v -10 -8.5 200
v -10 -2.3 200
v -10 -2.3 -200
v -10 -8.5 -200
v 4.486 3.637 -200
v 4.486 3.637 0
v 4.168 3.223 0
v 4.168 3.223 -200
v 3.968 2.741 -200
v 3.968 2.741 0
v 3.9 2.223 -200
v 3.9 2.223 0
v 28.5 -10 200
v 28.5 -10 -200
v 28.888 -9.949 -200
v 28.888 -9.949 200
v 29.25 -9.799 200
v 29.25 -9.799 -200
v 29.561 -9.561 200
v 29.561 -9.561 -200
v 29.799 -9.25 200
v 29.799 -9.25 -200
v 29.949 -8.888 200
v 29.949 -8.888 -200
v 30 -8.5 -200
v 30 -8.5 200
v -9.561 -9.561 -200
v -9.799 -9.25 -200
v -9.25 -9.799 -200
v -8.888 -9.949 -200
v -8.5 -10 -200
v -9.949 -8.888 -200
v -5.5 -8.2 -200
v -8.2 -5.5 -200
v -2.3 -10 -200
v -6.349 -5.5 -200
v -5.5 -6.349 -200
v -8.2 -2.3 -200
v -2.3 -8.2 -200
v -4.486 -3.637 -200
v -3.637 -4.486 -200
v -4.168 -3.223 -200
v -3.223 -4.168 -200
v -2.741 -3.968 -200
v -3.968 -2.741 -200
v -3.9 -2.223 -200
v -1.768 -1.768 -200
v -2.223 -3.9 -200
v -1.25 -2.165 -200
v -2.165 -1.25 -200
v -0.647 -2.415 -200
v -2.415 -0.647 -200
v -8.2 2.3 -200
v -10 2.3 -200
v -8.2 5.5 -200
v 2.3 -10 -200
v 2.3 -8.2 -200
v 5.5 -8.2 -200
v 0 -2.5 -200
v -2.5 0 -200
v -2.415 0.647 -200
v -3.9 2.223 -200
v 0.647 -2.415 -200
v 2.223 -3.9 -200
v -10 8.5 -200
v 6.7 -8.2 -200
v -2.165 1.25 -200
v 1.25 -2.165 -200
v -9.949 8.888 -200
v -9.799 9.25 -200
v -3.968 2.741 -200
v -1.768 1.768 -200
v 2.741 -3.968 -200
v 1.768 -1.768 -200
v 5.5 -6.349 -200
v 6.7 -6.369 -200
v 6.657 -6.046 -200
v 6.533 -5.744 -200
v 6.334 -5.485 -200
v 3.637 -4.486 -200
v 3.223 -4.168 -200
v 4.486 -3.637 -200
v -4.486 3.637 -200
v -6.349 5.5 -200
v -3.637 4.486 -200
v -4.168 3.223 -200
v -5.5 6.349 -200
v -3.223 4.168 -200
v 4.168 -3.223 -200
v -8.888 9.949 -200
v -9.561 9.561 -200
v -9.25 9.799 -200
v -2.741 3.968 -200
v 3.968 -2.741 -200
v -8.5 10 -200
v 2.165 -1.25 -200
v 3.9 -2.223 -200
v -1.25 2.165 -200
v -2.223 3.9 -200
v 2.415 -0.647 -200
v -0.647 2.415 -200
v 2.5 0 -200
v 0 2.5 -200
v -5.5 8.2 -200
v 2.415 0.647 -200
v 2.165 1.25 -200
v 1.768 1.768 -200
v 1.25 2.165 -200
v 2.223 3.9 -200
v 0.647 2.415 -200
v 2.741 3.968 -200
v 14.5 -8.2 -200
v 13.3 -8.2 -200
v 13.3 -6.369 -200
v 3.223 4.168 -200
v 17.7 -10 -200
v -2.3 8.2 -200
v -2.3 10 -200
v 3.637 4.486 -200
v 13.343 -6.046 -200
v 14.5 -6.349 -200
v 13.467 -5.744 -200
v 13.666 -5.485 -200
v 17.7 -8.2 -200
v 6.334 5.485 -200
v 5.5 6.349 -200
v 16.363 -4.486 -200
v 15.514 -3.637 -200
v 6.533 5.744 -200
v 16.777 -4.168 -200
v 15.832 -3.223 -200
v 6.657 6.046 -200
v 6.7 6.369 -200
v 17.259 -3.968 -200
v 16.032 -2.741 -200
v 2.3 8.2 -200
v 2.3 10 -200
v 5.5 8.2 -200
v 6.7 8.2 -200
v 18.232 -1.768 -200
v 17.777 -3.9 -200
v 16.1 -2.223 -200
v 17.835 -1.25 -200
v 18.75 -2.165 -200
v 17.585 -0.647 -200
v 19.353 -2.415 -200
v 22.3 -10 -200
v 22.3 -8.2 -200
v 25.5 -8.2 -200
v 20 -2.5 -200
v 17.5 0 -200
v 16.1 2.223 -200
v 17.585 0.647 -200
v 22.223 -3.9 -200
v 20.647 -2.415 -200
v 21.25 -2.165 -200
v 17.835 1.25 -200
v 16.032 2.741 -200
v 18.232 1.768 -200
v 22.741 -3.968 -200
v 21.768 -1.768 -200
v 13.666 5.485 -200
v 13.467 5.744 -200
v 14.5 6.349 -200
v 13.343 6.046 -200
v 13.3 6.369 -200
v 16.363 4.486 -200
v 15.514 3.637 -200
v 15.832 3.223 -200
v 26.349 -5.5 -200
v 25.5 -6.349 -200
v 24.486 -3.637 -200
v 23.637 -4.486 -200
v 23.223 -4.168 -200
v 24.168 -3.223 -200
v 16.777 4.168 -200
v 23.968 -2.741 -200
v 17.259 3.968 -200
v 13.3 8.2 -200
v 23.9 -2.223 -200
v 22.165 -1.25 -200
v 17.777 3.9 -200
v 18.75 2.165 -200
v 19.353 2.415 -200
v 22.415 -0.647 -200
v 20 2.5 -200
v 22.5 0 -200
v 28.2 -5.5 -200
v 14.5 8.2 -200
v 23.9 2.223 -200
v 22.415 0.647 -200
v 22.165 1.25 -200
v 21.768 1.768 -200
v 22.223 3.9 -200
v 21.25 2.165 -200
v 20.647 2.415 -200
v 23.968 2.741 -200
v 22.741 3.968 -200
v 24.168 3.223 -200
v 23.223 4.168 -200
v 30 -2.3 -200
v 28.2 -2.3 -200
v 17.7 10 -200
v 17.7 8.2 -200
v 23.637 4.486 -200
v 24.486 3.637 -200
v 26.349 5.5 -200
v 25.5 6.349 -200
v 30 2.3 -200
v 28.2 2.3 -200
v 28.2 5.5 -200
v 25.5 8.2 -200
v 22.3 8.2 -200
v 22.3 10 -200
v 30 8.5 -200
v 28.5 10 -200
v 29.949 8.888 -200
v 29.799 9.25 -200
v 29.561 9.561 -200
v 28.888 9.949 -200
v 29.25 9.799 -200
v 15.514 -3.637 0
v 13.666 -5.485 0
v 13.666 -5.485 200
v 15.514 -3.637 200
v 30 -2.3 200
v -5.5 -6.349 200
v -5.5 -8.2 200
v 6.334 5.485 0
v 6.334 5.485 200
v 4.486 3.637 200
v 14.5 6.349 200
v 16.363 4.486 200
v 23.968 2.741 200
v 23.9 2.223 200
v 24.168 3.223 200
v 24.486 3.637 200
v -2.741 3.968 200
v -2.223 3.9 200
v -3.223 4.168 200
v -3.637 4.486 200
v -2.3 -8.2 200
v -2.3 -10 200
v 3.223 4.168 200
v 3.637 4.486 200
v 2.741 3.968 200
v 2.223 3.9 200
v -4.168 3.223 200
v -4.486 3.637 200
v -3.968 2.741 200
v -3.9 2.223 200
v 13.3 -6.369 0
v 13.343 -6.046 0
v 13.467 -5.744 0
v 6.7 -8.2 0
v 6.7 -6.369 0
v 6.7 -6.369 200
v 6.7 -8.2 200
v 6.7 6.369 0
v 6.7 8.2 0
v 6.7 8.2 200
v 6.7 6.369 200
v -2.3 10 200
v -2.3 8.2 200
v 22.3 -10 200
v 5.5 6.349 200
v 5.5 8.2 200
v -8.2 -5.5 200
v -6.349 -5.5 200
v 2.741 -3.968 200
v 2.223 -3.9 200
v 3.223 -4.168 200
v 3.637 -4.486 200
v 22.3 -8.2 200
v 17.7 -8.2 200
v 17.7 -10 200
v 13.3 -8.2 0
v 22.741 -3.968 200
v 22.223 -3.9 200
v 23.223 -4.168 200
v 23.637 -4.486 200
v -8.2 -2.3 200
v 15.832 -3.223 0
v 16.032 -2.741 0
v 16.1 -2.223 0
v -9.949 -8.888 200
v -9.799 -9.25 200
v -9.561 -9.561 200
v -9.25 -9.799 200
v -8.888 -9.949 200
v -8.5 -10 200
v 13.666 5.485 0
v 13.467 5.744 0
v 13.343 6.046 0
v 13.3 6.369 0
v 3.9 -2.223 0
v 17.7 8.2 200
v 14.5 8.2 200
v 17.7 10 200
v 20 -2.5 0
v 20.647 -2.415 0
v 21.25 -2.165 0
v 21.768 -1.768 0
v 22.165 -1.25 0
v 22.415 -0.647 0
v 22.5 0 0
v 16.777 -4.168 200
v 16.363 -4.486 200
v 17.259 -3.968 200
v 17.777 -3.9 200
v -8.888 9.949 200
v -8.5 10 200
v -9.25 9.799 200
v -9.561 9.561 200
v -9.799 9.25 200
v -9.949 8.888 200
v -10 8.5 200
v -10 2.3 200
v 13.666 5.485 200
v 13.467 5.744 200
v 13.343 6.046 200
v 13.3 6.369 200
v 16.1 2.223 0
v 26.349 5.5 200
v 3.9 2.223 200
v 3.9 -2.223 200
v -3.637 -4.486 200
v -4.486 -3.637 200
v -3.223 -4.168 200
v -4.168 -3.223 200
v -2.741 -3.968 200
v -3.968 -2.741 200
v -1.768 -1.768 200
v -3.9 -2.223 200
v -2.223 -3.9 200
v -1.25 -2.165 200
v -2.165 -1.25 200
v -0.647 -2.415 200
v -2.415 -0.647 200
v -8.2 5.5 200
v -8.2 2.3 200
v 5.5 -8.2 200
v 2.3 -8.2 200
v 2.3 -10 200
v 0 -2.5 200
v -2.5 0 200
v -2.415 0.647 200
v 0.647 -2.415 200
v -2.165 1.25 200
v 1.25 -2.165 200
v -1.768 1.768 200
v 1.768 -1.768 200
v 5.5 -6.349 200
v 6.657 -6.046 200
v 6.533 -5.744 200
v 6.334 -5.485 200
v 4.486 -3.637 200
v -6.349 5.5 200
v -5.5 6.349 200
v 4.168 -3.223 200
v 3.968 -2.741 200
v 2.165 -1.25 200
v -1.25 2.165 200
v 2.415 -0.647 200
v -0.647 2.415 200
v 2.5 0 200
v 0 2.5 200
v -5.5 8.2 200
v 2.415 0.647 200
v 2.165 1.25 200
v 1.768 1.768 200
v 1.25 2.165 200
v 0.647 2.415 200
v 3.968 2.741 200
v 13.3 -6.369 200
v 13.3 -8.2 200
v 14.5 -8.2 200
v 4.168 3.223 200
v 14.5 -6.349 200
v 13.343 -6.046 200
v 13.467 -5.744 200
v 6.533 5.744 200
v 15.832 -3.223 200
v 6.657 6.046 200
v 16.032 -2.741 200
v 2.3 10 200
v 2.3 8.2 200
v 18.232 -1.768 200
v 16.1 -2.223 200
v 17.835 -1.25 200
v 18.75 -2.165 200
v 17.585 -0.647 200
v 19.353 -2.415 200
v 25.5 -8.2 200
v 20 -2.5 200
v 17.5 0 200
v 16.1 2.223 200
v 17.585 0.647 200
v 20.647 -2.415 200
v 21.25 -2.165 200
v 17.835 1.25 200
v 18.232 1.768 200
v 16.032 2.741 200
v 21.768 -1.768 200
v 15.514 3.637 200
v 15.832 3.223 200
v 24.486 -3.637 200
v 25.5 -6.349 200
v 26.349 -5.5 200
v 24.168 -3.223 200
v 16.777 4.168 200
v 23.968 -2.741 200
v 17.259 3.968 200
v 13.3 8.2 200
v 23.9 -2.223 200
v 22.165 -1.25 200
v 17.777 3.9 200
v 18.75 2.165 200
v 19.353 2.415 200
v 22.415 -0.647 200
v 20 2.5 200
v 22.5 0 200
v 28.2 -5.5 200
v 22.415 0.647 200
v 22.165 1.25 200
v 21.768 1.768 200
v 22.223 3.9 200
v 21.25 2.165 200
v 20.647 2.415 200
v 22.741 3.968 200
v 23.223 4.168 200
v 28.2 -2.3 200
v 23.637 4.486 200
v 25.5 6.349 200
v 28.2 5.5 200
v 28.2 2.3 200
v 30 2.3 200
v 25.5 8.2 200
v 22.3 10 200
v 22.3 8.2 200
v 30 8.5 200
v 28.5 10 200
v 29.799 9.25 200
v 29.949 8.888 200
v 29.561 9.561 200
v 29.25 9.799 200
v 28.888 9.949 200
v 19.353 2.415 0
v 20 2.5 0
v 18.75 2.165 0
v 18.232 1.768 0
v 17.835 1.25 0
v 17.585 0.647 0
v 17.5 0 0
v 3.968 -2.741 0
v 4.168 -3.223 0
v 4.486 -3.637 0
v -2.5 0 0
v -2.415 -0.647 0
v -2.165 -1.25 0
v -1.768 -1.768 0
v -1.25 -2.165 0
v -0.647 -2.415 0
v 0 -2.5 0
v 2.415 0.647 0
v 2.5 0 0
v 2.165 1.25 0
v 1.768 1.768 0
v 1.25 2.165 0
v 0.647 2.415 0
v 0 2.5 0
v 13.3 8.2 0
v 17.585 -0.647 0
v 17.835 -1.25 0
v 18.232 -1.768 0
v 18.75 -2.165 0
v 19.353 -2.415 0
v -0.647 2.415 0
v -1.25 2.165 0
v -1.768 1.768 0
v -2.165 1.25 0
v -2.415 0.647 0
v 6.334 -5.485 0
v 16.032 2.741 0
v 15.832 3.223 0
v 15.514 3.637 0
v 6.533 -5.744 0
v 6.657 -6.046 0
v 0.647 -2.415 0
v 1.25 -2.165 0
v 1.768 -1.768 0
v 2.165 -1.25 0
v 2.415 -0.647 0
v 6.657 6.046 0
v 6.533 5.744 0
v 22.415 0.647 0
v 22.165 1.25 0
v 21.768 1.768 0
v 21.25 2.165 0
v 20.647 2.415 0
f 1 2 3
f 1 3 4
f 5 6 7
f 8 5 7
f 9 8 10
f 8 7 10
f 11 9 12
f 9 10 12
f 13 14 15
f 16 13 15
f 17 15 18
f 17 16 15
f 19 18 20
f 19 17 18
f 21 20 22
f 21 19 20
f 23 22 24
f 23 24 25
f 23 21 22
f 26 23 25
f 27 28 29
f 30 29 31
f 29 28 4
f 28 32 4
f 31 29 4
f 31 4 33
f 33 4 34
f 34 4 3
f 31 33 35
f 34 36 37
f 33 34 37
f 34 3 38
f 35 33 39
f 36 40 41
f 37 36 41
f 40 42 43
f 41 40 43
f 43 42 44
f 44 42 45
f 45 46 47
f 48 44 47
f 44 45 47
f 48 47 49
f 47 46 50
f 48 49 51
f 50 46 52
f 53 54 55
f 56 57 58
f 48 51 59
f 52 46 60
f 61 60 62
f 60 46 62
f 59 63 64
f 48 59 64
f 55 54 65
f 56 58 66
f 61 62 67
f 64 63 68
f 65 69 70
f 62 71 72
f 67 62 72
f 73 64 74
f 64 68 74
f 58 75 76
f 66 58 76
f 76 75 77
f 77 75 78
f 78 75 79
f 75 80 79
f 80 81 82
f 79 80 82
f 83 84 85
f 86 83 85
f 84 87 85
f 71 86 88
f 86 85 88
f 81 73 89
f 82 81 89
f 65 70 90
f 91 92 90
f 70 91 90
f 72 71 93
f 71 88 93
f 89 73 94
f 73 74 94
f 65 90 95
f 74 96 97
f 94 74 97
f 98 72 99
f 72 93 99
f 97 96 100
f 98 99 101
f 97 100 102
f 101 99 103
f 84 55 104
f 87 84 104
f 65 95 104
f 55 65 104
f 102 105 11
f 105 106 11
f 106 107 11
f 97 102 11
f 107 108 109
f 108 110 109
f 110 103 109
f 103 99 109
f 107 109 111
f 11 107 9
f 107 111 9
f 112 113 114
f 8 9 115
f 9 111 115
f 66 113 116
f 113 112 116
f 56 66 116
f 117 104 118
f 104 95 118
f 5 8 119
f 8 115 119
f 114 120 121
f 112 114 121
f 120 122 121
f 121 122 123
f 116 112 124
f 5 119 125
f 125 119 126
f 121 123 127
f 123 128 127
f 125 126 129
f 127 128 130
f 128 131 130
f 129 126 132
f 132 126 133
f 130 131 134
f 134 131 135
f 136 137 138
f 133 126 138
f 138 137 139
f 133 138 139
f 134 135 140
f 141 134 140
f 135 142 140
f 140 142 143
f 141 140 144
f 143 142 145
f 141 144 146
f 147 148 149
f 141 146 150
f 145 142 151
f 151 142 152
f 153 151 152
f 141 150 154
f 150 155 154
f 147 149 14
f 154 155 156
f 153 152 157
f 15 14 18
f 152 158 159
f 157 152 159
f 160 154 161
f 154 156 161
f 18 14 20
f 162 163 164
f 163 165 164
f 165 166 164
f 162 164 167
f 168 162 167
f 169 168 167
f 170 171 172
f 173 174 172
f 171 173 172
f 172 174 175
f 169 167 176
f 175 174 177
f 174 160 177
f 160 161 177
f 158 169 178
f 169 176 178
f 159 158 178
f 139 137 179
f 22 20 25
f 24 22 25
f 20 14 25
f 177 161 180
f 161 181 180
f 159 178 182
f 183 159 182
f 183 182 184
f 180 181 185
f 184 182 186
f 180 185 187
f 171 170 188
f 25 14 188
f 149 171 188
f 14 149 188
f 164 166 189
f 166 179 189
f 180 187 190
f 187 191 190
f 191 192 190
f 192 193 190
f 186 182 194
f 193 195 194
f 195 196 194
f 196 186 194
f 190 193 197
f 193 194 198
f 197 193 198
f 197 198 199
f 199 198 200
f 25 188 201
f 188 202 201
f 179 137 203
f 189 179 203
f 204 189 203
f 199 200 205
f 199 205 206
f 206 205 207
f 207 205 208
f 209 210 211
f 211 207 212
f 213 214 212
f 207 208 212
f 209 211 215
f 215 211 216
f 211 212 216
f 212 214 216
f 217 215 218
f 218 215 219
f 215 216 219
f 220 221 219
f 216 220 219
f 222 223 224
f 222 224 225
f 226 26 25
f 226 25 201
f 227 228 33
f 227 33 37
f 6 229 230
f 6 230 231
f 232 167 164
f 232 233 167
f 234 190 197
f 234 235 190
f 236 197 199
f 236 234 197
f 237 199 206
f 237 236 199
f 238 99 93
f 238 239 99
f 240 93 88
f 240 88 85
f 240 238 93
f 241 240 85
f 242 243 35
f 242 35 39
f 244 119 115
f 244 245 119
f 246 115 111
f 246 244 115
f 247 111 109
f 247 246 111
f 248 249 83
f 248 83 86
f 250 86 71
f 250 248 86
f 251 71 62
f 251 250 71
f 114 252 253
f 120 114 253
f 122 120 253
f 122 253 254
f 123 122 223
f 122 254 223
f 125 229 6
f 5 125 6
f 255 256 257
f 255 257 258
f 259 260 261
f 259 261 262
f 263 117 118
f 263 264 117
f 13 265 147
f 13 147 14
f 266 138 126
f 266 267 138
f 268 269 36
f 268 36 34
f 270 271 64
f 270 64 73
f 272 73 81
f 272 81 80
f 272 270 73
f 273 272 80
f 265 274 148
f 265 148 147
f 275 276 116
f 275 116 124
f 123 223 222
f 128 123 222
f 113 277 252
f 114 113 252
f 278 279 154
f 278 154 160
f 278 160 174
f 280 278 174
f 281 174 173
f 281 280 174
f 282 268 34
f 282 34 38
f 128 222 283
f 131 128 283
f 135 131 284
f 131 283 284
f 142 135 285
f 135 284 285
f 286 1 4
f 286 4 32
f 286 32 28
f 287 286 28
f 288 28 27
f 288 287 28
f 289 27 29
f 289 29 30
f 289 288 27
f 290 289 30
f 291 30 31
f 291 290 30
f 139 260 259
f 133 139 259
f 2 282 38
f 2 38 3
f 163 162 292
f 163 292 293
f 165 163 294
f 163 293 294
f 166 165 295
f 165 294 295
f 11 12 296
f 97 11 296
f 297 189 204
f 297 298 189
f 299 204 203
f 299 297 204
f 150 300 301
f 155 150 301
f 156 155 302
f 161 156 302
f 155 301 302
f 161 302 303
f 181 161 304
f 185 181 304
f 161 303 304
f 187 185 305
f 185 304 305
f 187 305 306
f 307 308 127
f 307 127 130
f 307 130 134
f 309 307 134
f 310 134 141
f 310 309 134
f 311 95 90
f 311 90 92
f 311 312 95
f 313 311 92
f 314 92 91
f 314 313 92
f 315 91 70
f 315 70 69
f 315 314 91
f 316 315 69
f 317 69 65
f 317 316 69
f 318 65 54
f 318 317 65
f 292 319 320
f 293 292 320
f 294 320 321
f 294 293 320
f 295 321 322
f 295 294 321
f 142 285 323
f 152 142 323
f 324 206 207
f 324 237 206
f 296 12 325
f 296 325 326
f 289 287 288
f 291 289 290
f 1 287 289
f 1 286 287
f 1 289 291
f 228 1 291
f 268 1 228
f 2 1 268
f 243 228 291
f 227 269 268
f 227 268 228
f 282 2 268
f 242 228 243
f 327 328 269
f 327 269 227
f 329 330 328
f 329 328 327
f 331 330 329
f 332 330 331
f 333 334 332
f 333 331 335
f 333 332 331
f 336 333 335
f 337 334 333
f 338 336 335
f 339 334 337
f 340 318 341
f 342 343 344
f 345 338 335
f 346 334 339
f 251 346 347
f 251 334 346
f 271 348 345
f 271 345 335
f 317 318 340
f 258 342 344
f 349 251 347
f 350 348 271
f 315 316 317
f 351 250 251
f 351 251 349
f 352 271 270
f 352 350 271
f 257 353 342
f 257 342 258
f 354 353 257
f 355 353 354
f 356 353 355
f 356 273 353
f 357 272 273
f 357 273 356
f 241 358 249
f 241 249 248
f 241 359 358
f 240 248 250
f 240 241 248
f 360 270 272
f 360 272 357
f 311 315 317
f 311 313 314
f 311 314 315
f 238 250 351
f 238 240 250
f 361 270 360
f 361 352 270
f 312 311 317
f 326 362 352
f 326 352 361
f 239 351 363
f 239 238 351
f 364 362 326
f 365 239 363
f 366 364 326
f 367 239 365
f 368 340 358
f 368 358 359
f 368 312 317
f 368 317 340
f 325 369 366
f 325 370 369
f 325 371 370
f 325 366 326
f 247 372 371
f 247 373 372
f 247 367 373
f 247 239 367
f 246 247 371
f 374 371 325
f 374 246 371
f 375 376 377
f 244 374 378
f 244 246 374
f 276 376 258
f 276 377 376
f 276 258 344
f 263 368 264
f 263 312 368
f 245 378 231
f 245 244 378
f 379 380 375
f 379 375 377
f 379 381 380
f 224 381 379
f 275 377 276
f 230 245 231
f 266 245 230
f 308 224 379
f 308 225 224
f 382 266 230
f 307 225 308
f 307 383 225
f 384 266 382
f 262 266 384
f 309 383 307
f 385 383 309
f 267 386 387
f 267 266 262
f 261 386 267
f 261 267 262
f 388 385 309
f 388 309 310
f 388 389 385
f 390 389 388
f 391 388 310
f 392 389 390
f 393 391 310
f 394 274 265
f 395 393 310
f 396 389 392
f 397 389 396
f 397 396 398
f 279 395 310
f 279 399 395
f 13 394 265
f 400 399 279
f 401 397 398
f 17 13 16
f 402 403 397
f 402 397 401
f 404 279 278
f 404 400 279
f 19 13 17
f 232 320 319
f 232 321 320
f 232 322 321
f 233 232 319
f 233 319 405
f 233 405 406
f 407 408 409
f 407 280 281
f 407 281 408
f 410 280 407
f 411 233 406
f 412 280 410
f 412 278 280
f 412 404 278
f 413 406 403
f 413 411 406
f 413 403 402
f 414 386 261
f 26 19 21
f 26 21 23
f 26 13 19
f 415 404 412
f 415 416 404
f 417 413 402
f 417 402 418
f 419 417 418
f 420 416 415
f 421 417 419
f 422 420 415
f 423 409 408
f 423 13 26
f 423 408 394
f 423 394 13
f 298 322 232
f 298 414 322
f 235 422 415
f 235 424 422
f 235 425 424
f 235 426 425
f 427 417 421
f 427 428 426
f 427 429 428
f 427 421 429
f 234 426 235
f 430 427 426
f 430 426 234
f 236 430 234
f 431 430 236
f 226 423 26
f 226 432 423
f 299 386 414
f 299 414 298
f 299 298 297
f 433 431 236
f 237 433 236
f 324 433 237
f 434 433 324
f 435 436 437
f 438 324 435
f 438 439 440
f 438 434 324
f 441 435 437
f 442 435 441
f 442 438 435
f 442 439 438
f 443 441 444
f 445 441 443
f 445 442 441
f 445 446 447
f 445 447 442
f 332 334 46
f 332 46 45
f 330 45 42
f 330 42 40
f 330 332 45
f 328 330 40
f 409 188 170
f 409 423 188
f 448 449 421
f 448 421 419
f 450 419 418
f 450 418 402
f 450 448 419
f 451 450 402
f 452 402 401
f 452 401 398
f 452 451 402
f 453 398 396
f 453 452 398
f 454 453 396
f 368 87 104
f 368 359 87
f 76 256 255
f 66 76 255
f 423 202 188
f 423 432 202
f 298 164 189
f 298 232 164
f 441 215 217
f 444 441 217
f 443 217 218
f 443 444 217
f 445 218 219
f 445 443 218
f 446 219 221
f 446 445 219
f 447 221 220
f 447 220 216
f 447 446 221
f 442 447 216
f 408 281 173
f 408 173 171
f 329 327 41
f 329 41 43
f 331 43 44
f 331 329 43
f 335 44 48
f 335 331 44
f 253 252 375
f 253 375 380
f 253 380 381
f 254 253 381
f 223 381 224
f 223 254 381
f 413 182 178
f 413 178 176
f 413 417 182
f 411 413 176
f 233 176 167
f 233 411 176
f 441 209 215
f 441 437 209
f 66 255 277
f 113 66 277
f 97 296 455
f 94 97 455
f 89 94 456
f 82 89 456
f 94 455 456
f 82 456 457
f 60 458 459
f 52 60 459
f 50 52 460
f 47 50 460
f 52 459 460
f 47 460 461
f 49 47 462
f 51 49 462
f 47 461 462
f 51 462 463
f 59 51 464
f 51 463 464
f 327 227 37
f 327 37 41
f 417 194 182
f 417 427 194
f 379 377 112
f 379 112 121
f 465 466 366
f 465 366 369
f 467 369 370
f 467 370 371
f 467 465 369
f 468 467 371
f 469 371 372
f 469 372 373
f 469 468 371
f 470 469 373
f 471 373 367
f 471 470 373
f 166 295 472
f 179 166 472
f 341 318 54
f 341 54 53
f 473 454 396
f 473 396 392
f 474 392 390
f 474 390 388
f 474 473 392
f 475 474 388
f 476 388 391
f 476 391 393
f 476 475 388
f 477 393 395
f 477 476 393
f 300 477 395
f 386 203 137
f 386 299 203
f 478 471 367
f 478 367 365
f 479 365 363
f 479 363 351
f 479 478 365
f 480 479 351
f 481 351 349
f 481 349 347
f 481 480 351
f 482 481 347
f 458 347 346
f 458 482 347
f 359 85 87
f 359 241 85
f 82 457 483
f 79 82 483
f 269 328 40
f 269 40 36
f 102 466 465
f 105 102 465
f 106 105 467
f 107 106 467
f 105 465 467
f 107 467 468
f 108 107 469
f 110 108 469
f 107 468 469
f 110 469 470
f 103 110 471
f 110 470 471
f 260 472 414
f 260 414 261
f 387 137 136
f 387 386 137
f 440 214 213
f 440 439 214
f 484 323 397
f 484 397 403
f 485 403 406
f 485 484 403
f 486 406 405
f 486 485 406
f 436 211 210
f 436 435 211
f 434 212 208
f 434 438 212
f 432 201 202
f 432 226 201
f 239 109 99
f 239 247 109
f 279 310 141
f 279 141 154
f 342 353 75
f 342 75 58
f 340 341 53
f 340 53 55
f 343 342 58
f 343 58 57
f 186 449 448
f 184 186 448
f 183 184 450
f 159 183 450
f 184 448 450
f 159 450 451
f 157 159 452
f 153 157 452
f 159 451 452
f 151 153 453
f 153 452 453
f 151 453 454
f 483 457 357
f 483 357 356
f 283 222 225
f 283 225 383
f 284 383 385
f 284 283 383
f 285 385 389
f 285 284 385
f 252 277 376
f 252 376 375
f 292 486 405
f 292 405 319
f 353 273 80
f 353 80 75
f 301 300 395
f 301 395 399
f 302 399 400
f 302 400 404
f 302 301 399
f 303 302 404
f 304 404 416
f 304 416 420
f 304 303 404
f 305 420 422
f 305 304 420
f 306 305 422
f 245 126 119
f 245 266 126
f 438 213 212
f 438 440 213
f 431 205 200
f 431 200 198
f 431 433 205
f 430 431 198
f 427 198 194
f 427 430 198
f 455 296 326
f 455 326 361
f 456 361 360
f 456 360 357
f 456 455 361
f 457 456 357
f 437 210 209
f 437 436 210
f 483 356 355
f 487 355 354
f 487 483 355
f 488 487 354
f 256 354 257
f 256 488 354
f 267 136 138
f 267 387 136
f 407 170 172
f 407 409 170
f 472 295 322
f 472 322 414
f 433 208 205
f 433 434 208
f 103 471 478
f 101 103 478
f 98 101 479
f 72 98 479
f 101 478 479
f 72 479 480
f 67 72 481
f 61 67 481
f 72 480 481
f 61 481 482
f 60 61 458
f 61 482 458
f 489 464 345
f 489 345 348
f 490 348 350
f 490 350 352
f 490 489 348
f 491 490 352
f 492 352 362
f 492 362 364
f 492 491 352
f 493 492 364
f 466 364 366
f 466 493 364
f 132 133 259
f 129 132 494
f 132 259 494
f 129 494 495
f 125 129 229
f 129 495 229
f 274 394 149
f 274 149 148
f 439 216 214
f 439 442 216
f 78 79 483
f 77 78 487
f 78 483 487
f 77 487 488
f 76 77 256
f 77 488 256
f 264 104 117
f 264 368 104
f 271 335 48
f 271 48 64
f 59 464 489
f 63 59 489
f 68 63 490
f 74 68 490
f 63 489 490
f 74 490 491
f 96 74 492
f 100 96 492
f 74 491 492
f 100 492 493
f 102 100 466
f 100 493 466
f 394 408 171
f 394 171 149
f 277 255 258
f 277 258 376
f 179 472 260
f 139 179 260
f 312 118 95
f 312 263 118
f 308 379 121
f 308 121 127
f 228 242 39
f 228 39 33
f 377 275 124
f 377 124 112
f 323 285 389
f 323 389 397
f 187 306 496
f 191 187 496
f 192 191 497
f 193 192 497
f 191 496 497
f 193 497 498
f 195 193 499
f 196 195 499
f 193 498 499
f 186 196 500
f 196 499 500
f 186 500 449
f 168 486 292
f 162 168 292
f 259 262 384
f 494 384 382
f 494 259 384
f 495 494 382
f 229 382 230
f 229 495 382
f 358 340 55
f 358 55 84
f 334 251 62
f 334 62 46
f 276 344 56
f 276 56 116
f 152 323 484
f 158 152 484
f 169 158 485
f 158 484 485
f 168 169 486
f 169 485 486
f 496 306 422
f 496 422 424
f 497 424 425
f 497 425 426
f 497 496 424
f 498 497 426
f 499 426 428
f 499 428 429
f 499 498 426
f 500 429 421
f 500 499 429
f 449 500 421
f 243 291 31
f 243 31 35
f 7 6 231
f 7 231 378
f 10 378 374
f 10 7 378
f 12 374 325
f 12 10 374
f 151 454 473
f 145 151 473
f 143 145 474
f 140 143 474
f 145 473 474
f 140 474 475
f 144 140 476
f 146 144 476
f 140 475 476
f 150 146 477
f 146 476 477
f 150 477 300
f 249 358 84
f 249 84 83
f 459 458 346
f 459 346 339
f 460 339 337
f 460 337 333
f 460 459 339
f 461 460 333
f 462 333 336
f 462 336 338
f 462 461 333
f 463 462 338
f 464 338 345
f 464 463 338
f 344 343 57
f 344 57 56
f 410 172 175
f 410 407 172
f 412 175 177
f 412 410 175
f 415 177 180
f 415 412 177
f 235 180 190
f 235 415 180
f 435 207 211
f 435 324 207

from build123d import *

# Parameters (mm, degrees)
SALIENTE_EXTRUIR1_DEPTH = 200


with BuildPart() as part:
    # Croquis1 → Saliente-Extruir1 (new, symmetric)
    with BuildSketch(Plane.XY):
        with BuildLine():
            Line((-10, 8.5), (-10, 2.3))
            Line((-10, 2.3), (-8.2, 2.3))
            Line((-8.2, 2.3), (-8.2, 5.5))
            Line((-8.2, 5.5), (-6.348528137, 5.5))
            Line((-6.348528137, 5.5), (-4.485786438, 3.6372583))
            ThreePointArc((-4.485786438, 3.6372583), (-4.052240935, 2.988411603), (-3.9, 2.223044738))
            Line((-3.9, 2.223044738), (-3.9, 0))
            Line((-3.9, 0), (-3.9, -2.223044738))
            ThreePointArc((-3.9, -2.223044738), (-4.052240935, -2.988411603), (-4.485786438, -3.6372583))
            Line((-4.485786438, -3.6372583), (-6.348528137, -5.5))
            Line((-6.348528137, -5.5), (-8.2, -5.5))
            Line((-8.2, -5.5), (-8.2, -2.3))
            Line((-8.2, -2.3), (-10, -2.3))
            Line((-10, -2.3), (-10, -8.5))
            ThreePointArc((-10, -8.5), (-9.560660172, -9.560660172), (-8.5, -10))
            Line((-8.5, -10), (-2.3, -10))
            Line((-2.3, -10), (-2.3, -8.2))
            Line((-2.3, -8.2), (-5.5, -8.2))
            Line((-5.5, -8.2), (-5.5, -6.348528137))
            Line((-5.5, -6.348528137), (-3.6372583, -4.485786438))
            ThreePointArc((-3.6372583, -4.485786438), (-2.988411603, -4.052240935), (-2.223044738, -3.9))
            Line((-2.223044738, -3.9), (0, -3.9))
            Line((0, -3.9), (2.223044738, -3.9))
            ThreePointArc((2.223044738, -3.9), (2.988411603, -4.052240935), (3.6372583, -4.485786438))
            Line((3.6372583, -4.485786438), (5.5, -6.348528137))
            Line((5.5, -6.348528137), (5.5, -8.2))
            Line((5.5, -8.2), (2.3, -8.2))
            Line((2.3, -8.2), (2.3, -10))
            Line((2.3, -10), (17.7, -10))
            Line((17.7, -10), (17.7, -8.2))
            Line((17.7, -8.2), (14.5, -8.2))
            Line((14.5, -8.2), (14.5, -6.348528137))
            Line((14.5, -6.348528137), (16.3627417, -4.485786438))
            ThreePointArc((16.3627417, -4.485786438), (17.011588397, -4.052240935), (17.776955262, -3.9))
            Line((17.776955262, -3.9), (20, -3.9))
            Line((20, -3.9), (22.223044738, -3.9))
            ThreePointArc((22.223044738, -3.9), (22.988411603, -4.052240935), (23.6372583, -4.485786438))
            Line((23.6372583, -4.485786438), (25.5, -6.348528137))
            Line((25.5, -6.348528137), (25.5, -8.2))
            Line((25.5, -8.2), (22.3, -8.2))
            Line((22.3, -8.2), (22.3, -10))
            Line((22.3, -10), (28.5, -10))
            ThreePointArc((28.5, -10), (29.560660172, -9.560660172), (30, -8.5))
            Line((30, -8.5), (30, -2.3))
            Line((30, -2.3), (28.2, -2.3))
            Line((28.2, -2.3), (28.2, -5.5))
            Line((28.2, -5.5), (26.348528137, -5.5))
            Line((26.348528137, -5.5), (24.485786438, -3.6372583))
            ThreePointArc((24.485786438, -3.6372583), (24.052240935, -2.988411603), (23.9, -2.223044738))
            Line((23.9, -2.223044738), (23.9, 0))
            Line((23.9, 0), (23.9, 2.223044738))
            ThreePointArc((23.9, 2.223044738), (24.052240935, 2.988411603), (24.485786438, 3.6372583))
            Line((24.485786438, 3.6372583), (26.348528137, 5.5))
            Line((26.348528137, 5.5), (28.2, 5.5))
            Line((28.2, 5.5), (28.2, 2.3))
            Line((28.2, 2.3), (30, 2.3))
            Line((30, 2.3), (30, 8.5))
            ThreePointArc((30, 8.5), (29.560660172, 9.560660172), (28.5, 10))
            Line((28.5, 10), (22.3, 10))
            Line((22.3, 10), (22.3, 8.2))
            Line((22.3, 8.2), (25.5, 8.2))
            Line((25.5, 8.2), (25.5, 6.348528137))
            Line((25.5, 6.348528137), (23.6372583, 4.485786438))
            ThreePointArc((23.6372583, 4.485786438), (22.988411603, 4.052240935), (22.223044738, 3.9))
            Line((22.223044738, 3.9), (20, 3.9))
            Line((20, 3.9), (17.776955262, 3.9))
            ThreePointArc((17.776955262, 3.9), (17.011588397, 4.052240935), (16.3627417, 4.485786438))
            Line((16.3627417, 4.485786438), (14.5, 6.348528137))
            Line((14.5, 6.348528137), (14.5, 8.2))
            Line((14.5, 8.2), (17.7, 8.2))
            Line((17.7, 8.2), (17.7, 10))
            Line((17.7, 10), (2.3, 10))
            Line((2.3, 10), (2.3, 8.2))
            Line((2.3, 8.2), (5.5, 8.2))
            Line((5.5, 8.2), (5.5, 6.348528137))
            Line((5.5, 6.348528137), (3.6372583, 4.485786438))
            ThreePointArc((3.6372583, 4.485786438), (2.988411603, 4.052240935), (2.223044738, 3.9))
            Line((2.223044738, 3.9), (0, 3.9))
            Line((0, 3.9), (-2.223044738, 3.9))
            ThreePointArc((-2.223044738, 3.9), (-2.988411603, 4.052240935), (-3.6372583, 4.485786438))
            Line((-3.6372583, 4.485786438), (-5.5, 6.348528137))
            Line((-5.5, 6.348528137), (-5.5, 8.2))
            Line((-5.5, 8.2), (-2.3, 8.2))
            Line((-2.3, 8.2), (-2.3, 10))
            Line((-2.3, 10), (-8.5, 10))
            ThreePointArc((-8.5, 10), (-9.560660172, 9.560660172), (-10, 8.5))
        make_face()
        with BuildLine():
            Line((3.9, 2.223044738), (3.9, 0))
            Line((3.9, 0), (3.9, -2.223044738))
            ThreePointArc((3.9, -2.223044738), (4.052240935, -2.988411603), (4.485786438, -3.6372583))
            Line((4.485786438, -3.6372583), (6.333883476, -5.485355339))
            ThreePointArc((6.333883476, -5.485355339), (6.604849416, -5.890884525), (6.7, -6.369238816))
            Line((6.7, -6.369238816), (6.7, -8.2))
            Line((6.7, -8.2), (13.3, -8.2))
            Line((13.3, -8.2), (13.3, -6.369238816))
            ThreePointArc((13.3, -6.369238816), (13.395150584, -5.890884525), (13.666116524, -5.485355339))
            Line((13.666116524, -5.485355339), (15.514213562, -3.6372583))
            ThreePointArc((15.514213562, -3.6372583), (15.947759065, -2.988411603), (16.1, -2.223044738))
            Line((16.1, -2.223044738), (16.1, 0))
            Line((16.1, 0), (16.1, 2.223044738))
            ThreePointArc((16.1, 2.223044738), (15.947759065, 2.988411603), (15.514213562, 3.6372583))
            Line((15.514213562, 3.6372583), (13.666116524, 5.485355339))
            ThreePointArc((13.666116524, 5.485355339), (13.395150584, 5.890884525), (13.3, 6.369238816))
            Line((13.3, 6.369238816), (13.3, 8.2))
            Line((13.3, 8.2), (6.7, 8.2))
            Line((6.7, 8.2), (6.7, 6.369238816))
            ThreePointArc((6.7, 6.369238816), (6.604849416, 5.890884525), (6.333883476, 5.485355339))
            Line((6.333883476, 5.485355339), (4.485786438, 3.6372583))
            ThreePointArc((4.485786438, 3.6372583), (4.052240935, 2.988411603), (3.9, 2.223044738))
        make_face(mode=Mode.SUBTRACT)
        with BuildLine():
            ThreePointArc((0, 2.5), (-1.767766953, 1.767766953), (-2.5, 0))
            ThreePointArc((-2.5, 0), (-1.767766953, -1.767766953), (0, -2.5))
            ThreePointArc((0, -2.5), (1.767766953, -1.767766953), (2.5, 0))
            ThreePointArc((2.5, 0), (1.767766953, 1.767766953), (0, 2.5))
        make_face(mode=Mode.SUBTRACT)
        with BuildLine():
            ThreePointArc((20, 2.5), (18.232233047, 1.767766953), (17.5, 0))
            ThreePointArc((17.5, 0), (18.232233047, -1.767766953), (20, -2.5))
            ThreePointArc((20, -2.5), (21.767766953, -1.767766953), (22.5, 0))
            ThreePointArc((22.5, 0), (21.767766953, 1.767766953), (20, 2.5))
        make_face(mode=Mode.SUBTRACT)
    extrude(amount=SALIENTE_EXTRUIR1_DEPTH, both=True)


solid = part.part
